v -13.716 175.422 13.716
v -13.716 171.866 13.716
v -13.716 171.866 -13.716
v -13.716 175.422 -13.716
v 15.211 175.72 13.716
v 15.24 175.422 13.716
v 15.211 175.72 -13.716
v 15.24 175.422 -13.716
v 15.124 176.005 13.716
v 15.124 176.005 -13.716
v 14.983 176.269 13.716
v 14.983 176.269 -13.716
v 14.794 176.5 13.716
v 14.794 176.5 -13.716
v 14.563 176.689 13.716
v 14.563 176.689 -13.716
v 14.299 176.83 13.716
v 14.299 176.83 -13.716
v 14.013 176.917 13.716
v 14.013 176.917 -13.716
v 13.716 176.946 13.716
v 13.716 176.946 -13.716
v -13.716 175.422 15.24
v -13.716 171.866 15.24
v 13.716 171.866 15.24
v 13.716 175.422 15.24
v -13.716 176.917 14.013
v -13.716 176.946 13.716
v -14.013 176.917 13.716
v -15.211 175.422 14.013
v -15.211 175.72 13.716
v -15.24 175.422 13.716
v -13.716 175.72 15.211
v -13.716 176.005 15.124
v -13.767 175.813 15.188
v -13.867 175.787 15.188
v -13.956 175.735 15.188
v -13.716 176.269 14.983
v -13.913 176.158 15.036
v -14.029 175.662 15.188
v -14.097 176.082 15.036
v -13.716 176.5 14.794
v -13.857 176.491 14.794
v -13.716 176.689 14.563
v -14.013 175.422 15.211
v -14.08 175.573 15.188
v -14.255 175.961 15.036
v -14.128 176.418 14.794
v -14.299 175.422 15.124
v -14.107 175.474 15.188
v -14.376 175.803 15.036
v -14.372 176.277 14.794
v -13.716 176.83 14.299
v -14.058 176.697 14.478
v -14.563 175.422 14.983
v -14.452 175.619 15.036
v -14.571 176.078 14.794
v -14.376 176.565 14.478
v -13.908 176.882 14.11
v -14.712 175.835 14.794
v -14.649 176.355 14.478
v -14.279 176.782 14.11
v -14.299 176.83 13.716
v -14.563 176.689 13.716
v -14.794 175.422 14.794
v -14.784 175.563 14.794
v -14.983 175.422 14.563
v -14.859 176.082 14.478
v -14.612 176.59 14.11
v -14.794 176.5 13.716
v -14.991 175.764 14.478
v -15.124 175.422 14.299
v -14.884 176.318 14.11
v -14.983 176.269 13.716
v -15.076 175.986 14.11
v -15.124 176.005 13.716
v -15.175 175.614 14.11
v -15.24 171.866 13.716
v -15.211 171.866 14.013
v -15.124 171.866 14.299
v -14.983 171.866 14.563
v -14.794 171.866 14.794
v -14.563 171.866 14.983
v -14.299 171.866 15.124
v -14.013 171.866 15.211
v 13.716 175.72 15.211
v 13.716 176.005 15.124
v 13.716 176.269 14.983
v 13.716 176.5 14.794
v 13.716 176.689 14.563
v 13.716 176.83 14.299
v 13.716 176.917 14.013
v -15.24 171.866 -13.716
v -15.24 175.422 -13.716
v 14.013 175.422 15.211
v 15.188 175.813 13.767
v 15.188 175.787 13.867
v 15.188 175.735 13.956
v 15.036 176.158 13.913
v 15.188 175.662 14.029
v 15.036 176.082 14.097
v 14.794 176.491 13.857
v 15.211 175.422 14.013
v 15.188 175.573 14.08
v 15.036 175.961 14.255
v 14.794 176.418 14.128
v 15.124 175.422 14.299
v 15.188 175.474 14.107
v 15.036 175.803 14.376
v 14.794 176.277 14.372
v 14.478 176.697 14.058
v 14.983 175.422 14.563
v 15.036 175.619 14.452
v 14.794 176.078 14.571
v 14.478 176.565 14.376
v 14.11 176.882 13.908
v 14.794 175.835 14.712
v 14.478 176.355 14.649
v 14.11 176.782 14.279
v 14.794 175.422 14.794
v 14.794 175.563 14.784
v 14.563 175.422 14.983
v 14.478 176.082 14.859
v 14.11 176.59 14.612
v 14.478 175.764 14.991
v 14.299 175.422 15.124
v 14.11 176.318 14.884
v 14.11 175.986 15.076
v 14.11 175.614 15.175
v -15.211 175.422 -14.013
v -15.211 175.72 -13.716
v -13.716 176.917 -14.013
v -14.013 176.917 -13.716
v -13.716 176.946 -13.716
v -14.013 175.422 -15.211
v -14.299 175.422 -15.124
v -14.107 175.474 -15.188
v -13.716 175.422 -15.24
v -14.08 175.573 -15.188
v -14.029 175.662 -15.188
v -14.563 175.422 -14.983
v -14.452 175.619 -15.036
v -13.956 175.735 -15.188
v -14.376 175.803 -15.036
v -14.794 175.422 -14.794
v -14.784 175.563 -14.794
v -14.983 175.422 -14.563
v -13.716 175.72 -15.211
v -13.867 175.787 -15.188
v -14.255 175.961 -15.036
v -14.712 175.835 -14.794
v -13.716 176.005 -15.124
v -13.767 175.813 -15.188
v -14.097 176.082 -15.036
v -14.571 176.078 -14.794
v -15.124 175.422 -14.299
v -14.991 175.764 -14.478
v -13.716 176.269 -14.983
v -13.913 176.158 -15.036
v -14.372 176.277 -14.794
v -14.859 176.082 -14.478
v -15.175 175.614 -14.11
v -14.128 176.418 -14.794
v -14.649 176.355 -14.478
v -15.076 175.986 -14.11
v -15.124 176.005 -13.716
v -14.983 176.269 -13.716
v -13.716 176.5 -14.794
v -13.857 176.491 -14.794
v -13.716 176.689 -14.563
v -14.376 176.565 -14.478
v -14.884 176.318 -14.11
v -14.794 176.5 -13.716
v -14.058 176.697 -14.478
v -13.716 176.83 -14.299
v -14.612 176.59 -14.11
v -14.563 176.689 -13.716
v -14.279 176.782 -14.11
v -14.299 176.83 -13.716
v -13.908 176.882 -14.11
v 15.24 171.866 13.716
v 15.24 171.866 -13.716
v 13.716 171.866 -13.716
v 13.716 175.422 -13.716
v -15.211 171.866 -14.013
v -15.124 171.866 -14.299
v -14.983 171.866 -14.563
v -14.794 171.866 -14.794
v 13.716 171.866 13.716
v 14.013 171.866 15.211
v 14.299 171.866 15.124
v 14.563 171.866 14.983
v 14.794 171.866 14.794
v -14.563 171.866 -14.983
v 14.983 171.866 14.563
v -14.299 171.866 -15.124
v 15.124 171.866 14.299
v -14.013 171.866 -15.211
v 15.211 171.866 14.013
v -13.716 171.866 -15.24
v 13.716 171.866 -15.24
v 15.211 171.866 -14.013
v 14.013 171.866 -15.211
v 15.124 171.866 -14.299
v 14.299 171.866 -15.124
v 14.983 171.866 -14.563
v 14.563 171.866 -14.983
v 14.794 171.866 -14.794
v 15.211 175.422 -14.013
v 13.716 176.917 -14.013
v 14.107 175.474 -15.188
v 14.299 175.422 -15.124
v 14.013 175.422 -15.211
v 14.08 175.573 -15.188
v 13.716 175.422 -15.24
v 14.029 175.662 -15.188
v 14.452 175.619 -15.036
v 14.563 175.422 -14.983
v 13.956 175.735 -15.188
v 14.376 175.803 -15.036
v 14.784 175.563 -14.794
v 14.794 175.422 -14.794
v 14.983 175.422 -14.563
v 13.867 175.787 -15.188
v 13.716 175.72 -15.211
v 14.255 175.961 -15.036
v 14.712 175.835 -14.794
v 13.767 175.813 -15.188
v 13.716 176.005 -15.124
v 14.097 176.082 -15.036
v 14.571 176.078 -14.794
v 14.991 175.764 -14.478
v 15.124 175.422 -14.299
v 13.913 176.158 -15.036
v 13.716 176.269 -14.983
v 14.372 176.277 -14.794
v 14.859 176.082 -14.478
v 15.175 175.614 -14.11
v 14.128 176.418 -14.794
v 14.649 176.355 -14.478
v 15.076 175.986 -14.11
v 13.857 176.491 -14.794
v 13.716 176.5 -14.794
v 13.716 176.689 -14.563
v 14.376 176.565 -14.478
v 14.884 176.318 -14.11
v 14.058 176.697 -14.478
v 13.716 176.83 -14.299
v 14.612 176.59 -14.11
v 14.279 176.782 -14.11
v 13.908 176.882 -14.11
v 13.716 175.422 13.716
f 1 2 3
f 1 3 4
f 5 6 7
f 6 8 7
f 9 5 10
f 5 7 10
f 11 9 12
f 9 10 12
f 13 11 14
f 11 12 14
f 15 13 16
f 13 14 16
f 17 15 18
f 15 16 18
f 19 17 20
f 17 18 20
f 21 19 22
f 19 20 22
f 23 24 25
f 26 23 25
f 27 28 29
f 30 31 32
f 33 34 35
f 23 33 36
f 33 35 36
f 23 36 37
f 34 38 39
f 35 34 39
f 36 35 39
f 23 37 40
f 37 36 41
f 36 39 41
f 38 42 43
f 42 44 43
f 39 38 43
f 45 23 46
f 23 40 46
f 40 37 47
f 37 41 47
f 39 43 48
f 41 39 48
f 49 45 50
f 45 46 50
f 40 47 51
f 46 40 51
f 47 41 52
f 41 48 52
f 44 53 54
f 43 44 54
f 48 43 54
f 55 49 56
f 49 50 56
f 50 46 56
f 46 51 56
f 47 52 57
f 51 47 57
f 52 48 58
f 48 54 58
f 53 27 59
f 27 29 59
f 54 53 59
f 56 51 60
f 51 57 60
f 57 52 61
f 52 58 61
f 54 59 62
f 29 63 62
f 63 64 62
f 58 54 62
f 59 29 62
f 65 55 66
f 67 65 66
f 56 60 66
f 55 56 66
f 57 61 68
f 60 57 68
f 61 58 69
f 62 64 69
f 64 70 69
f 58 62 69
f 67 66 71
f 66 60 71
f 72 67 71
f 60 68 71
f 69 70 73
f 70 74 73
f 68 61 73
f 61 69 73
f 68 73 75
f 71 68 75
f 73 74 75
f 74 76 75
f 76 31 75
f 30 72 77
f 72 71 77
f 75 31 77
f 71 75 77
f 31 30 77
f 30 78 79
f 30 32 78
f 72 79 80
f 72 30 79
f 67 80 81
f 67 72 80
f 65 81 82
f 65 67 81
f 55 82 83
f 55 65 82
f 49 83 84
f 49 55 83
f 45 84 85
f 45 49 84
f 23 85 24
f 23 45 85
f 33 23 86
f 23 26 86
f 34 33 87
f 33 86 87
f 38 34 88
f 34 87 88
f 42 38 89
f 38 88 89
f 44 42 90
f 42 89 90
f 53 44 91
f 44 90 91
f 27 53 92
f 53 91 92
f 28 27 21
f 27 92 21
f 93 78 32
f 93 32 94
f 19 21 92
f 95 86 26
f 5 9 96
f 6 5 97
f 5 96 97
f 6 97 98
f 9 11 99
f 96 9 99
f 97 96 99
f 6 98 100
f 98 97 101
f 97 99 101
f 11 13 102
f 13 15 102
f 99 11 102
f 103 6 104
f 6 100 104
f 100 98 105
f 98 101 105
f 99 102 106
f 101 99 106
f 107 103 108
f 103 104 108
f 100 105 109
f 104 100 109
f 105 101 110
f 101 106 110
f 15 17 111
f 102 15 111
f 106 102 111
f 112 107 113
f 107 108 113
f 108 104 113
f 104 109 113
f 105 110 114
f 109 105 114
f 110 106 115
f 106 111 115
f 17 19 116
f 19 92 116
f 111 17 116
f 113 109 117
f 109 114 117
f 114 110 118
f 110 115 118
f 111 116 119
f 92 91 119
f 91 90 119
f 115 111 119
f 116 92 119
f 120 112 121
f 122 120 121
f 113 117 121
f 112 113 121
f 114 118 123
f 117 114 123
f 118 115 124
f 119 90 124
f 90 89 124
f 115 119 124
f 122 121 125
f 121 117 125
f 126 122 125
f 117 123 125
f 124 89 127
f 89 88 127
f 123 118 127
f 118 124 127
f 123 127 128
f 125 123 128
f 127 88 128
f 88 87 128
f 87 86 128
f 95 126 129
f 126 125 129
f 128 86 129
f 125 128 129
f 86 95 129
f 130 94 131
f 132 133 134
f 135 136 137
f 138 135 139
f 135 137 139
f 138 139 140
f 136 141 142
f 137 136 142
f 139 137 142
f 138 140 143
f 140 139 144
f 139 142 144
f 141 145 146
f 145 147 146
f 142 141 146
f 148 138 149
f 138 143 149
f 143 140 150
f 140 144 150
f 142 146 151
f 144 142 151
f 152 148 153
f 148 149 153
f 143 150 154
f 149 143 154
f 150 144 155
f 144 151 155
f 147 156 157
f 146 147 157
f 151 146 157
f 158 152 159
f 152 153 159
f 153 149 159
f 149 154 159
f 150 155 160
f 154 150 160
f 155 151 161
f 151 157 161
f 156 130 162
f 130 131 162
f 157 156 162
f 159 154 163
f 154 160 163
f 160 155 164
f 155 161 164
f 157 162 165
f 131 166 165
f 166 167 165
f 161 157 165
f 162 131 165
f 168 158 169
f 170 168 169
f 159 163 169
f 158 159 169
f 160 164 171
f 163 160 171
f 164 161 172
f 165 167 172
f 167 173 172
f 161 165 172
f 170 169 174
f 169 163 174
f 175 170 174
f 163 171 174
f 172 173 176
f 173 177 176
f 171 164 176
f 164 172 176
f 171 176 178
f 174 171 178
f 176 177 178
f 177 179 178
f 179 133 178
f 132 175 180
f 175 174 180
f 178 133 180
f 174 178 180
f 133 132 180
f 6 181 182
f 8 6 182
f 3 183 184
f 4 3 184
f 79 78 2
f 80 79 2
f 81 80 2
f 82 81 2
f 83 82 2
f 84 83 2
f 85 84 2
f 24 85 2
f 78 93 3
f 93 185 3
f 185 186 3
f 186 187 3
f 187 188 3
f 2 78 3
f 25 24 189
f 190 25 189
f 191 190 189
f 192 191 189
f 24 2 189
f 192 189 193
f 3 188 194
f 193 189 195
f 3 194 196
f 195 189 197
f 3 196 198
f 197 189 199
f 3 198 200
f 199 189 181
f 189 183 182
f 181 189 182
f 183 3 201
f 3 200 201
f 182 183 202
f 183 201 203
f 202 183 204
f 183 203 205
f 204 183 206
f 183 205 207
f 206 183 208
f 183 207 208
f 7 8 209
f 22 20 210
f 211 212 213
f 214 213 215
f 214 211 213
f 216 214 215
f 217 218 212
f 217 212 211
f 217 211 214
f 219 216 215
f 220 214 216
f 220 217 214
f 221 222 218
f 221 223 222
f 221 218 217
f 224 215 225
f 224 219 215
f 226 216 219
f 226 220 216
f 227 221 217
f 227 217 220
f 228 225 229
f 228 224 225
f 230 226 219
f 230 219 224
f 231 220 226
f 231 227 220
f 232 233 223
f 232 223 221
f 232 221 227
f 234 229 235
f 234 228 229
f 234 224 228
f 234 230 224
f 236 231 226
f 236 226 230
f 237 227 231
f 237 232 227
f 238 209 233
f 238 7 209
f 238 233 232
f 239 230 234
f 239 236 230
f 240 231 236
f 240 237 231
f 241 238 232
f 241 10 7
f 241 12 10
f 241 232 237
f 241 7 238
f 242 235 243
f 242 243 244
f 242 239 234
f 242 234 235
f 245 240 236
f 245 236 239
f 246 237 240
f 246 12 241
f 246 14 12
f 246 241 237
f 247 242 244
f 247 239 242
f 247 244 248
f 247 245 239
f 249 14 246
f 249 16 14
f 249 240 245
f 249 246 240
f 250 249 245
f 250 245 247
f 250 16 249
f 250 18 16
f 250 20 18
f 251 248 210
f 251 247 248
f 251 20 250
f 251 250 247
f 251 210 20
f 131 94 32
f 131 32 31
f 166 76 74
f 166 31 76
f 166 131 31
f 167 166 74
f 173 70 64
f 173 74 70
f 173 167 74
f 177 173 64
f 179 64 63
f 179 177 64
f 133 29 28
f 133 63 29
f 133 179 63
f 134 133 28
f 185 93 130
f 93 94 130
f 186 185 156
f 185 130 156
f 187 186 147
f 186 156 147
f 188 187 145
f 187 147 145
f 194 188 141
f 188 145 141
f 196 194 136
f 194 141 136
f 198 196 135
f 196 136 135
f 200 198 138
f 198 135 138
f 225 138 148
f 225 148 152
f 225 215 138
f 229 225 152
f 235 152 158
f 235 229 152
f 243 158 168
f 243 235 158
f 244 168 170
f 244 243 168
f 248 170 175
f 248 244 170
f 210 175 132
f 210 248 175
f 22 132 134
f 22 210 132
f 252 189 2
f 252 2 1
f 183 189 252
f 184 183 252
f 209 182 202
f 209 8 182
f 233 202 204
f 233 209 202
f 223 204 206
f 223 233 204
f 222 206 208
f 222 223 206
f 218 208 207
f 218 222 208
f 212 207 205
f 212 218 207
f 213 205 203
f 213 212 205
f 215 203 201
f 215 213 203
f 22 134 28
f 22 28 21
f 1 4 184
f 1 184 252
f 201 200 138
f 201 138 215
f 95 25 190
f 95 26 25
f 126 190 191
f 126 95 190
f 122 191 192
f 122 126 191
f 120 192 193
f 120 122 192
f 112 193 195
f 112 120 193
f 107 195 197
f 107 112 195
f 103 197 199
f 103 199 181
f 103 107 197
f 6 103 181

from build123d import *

# Parameters (mm, degrees)
SKETCH1_W           = 1524
SKETCH1_H           = 1524
BOSS_EXTRUDE1_DEPTH = 254
FILLET1_R           = 76.2
SHELL1_START        = -685.8
SHELL1_OUTLINE_W    = 177.8
SHELL1_OUTLINE_H    = 1371.6
SHELL1_DEPTH        = 1371.6
SCALE1_SCALE        = 0.02


# Read off the part's stored shape, not the designer's step: Shell1
with BuildPart() as part:
    # Sketch1 → Boss-Extrude1 (new body)
    with BuildSketch(Plane(origin=(0, 0, 0), x_dir=(1, 0, 0), z_dir=(0, 1, 0))):
        Rectangle(SKETCH1_W, SKETCH1_H)
    extrude(amount=BOSS_EXTRUDE1_DEPTH)

    # Fillet1
    fillet1_edges = [part.edges().sort_by_distance(p)[0] for p in [
        (-762, 254, 0),
        (0, 254, 762),
        (762, 254, 0),
        (762, 127, 762),
        (-762, 127, 762),
        (-762, 127, -762),
        (762, 127, -762),
        (0, 254, -762),
    ]]
    fillet(fillet1_edges, radius=FILLET1_R)

    # Shell1 outline → Shell1 (cut)
    with BuildSketch(Plane.YZ.offset(SHELL1_START)):
        with Locations((88.9, 0)):
            Rectangle(SHELL1_OUTLINE_W, SHELL1_OUTLINE_H)
    extrude(amount=SHELL1_DEPTH, mode=Mode.SUBTRACT)


with BuildPart() as part_1:
    # Scale1: scaled about (0, 175.373677195, 0)
    add(part.part.scale(SCALE1_SCALE).moved(Location((0, 171.866203651, 0))))


solid = part_1.part
